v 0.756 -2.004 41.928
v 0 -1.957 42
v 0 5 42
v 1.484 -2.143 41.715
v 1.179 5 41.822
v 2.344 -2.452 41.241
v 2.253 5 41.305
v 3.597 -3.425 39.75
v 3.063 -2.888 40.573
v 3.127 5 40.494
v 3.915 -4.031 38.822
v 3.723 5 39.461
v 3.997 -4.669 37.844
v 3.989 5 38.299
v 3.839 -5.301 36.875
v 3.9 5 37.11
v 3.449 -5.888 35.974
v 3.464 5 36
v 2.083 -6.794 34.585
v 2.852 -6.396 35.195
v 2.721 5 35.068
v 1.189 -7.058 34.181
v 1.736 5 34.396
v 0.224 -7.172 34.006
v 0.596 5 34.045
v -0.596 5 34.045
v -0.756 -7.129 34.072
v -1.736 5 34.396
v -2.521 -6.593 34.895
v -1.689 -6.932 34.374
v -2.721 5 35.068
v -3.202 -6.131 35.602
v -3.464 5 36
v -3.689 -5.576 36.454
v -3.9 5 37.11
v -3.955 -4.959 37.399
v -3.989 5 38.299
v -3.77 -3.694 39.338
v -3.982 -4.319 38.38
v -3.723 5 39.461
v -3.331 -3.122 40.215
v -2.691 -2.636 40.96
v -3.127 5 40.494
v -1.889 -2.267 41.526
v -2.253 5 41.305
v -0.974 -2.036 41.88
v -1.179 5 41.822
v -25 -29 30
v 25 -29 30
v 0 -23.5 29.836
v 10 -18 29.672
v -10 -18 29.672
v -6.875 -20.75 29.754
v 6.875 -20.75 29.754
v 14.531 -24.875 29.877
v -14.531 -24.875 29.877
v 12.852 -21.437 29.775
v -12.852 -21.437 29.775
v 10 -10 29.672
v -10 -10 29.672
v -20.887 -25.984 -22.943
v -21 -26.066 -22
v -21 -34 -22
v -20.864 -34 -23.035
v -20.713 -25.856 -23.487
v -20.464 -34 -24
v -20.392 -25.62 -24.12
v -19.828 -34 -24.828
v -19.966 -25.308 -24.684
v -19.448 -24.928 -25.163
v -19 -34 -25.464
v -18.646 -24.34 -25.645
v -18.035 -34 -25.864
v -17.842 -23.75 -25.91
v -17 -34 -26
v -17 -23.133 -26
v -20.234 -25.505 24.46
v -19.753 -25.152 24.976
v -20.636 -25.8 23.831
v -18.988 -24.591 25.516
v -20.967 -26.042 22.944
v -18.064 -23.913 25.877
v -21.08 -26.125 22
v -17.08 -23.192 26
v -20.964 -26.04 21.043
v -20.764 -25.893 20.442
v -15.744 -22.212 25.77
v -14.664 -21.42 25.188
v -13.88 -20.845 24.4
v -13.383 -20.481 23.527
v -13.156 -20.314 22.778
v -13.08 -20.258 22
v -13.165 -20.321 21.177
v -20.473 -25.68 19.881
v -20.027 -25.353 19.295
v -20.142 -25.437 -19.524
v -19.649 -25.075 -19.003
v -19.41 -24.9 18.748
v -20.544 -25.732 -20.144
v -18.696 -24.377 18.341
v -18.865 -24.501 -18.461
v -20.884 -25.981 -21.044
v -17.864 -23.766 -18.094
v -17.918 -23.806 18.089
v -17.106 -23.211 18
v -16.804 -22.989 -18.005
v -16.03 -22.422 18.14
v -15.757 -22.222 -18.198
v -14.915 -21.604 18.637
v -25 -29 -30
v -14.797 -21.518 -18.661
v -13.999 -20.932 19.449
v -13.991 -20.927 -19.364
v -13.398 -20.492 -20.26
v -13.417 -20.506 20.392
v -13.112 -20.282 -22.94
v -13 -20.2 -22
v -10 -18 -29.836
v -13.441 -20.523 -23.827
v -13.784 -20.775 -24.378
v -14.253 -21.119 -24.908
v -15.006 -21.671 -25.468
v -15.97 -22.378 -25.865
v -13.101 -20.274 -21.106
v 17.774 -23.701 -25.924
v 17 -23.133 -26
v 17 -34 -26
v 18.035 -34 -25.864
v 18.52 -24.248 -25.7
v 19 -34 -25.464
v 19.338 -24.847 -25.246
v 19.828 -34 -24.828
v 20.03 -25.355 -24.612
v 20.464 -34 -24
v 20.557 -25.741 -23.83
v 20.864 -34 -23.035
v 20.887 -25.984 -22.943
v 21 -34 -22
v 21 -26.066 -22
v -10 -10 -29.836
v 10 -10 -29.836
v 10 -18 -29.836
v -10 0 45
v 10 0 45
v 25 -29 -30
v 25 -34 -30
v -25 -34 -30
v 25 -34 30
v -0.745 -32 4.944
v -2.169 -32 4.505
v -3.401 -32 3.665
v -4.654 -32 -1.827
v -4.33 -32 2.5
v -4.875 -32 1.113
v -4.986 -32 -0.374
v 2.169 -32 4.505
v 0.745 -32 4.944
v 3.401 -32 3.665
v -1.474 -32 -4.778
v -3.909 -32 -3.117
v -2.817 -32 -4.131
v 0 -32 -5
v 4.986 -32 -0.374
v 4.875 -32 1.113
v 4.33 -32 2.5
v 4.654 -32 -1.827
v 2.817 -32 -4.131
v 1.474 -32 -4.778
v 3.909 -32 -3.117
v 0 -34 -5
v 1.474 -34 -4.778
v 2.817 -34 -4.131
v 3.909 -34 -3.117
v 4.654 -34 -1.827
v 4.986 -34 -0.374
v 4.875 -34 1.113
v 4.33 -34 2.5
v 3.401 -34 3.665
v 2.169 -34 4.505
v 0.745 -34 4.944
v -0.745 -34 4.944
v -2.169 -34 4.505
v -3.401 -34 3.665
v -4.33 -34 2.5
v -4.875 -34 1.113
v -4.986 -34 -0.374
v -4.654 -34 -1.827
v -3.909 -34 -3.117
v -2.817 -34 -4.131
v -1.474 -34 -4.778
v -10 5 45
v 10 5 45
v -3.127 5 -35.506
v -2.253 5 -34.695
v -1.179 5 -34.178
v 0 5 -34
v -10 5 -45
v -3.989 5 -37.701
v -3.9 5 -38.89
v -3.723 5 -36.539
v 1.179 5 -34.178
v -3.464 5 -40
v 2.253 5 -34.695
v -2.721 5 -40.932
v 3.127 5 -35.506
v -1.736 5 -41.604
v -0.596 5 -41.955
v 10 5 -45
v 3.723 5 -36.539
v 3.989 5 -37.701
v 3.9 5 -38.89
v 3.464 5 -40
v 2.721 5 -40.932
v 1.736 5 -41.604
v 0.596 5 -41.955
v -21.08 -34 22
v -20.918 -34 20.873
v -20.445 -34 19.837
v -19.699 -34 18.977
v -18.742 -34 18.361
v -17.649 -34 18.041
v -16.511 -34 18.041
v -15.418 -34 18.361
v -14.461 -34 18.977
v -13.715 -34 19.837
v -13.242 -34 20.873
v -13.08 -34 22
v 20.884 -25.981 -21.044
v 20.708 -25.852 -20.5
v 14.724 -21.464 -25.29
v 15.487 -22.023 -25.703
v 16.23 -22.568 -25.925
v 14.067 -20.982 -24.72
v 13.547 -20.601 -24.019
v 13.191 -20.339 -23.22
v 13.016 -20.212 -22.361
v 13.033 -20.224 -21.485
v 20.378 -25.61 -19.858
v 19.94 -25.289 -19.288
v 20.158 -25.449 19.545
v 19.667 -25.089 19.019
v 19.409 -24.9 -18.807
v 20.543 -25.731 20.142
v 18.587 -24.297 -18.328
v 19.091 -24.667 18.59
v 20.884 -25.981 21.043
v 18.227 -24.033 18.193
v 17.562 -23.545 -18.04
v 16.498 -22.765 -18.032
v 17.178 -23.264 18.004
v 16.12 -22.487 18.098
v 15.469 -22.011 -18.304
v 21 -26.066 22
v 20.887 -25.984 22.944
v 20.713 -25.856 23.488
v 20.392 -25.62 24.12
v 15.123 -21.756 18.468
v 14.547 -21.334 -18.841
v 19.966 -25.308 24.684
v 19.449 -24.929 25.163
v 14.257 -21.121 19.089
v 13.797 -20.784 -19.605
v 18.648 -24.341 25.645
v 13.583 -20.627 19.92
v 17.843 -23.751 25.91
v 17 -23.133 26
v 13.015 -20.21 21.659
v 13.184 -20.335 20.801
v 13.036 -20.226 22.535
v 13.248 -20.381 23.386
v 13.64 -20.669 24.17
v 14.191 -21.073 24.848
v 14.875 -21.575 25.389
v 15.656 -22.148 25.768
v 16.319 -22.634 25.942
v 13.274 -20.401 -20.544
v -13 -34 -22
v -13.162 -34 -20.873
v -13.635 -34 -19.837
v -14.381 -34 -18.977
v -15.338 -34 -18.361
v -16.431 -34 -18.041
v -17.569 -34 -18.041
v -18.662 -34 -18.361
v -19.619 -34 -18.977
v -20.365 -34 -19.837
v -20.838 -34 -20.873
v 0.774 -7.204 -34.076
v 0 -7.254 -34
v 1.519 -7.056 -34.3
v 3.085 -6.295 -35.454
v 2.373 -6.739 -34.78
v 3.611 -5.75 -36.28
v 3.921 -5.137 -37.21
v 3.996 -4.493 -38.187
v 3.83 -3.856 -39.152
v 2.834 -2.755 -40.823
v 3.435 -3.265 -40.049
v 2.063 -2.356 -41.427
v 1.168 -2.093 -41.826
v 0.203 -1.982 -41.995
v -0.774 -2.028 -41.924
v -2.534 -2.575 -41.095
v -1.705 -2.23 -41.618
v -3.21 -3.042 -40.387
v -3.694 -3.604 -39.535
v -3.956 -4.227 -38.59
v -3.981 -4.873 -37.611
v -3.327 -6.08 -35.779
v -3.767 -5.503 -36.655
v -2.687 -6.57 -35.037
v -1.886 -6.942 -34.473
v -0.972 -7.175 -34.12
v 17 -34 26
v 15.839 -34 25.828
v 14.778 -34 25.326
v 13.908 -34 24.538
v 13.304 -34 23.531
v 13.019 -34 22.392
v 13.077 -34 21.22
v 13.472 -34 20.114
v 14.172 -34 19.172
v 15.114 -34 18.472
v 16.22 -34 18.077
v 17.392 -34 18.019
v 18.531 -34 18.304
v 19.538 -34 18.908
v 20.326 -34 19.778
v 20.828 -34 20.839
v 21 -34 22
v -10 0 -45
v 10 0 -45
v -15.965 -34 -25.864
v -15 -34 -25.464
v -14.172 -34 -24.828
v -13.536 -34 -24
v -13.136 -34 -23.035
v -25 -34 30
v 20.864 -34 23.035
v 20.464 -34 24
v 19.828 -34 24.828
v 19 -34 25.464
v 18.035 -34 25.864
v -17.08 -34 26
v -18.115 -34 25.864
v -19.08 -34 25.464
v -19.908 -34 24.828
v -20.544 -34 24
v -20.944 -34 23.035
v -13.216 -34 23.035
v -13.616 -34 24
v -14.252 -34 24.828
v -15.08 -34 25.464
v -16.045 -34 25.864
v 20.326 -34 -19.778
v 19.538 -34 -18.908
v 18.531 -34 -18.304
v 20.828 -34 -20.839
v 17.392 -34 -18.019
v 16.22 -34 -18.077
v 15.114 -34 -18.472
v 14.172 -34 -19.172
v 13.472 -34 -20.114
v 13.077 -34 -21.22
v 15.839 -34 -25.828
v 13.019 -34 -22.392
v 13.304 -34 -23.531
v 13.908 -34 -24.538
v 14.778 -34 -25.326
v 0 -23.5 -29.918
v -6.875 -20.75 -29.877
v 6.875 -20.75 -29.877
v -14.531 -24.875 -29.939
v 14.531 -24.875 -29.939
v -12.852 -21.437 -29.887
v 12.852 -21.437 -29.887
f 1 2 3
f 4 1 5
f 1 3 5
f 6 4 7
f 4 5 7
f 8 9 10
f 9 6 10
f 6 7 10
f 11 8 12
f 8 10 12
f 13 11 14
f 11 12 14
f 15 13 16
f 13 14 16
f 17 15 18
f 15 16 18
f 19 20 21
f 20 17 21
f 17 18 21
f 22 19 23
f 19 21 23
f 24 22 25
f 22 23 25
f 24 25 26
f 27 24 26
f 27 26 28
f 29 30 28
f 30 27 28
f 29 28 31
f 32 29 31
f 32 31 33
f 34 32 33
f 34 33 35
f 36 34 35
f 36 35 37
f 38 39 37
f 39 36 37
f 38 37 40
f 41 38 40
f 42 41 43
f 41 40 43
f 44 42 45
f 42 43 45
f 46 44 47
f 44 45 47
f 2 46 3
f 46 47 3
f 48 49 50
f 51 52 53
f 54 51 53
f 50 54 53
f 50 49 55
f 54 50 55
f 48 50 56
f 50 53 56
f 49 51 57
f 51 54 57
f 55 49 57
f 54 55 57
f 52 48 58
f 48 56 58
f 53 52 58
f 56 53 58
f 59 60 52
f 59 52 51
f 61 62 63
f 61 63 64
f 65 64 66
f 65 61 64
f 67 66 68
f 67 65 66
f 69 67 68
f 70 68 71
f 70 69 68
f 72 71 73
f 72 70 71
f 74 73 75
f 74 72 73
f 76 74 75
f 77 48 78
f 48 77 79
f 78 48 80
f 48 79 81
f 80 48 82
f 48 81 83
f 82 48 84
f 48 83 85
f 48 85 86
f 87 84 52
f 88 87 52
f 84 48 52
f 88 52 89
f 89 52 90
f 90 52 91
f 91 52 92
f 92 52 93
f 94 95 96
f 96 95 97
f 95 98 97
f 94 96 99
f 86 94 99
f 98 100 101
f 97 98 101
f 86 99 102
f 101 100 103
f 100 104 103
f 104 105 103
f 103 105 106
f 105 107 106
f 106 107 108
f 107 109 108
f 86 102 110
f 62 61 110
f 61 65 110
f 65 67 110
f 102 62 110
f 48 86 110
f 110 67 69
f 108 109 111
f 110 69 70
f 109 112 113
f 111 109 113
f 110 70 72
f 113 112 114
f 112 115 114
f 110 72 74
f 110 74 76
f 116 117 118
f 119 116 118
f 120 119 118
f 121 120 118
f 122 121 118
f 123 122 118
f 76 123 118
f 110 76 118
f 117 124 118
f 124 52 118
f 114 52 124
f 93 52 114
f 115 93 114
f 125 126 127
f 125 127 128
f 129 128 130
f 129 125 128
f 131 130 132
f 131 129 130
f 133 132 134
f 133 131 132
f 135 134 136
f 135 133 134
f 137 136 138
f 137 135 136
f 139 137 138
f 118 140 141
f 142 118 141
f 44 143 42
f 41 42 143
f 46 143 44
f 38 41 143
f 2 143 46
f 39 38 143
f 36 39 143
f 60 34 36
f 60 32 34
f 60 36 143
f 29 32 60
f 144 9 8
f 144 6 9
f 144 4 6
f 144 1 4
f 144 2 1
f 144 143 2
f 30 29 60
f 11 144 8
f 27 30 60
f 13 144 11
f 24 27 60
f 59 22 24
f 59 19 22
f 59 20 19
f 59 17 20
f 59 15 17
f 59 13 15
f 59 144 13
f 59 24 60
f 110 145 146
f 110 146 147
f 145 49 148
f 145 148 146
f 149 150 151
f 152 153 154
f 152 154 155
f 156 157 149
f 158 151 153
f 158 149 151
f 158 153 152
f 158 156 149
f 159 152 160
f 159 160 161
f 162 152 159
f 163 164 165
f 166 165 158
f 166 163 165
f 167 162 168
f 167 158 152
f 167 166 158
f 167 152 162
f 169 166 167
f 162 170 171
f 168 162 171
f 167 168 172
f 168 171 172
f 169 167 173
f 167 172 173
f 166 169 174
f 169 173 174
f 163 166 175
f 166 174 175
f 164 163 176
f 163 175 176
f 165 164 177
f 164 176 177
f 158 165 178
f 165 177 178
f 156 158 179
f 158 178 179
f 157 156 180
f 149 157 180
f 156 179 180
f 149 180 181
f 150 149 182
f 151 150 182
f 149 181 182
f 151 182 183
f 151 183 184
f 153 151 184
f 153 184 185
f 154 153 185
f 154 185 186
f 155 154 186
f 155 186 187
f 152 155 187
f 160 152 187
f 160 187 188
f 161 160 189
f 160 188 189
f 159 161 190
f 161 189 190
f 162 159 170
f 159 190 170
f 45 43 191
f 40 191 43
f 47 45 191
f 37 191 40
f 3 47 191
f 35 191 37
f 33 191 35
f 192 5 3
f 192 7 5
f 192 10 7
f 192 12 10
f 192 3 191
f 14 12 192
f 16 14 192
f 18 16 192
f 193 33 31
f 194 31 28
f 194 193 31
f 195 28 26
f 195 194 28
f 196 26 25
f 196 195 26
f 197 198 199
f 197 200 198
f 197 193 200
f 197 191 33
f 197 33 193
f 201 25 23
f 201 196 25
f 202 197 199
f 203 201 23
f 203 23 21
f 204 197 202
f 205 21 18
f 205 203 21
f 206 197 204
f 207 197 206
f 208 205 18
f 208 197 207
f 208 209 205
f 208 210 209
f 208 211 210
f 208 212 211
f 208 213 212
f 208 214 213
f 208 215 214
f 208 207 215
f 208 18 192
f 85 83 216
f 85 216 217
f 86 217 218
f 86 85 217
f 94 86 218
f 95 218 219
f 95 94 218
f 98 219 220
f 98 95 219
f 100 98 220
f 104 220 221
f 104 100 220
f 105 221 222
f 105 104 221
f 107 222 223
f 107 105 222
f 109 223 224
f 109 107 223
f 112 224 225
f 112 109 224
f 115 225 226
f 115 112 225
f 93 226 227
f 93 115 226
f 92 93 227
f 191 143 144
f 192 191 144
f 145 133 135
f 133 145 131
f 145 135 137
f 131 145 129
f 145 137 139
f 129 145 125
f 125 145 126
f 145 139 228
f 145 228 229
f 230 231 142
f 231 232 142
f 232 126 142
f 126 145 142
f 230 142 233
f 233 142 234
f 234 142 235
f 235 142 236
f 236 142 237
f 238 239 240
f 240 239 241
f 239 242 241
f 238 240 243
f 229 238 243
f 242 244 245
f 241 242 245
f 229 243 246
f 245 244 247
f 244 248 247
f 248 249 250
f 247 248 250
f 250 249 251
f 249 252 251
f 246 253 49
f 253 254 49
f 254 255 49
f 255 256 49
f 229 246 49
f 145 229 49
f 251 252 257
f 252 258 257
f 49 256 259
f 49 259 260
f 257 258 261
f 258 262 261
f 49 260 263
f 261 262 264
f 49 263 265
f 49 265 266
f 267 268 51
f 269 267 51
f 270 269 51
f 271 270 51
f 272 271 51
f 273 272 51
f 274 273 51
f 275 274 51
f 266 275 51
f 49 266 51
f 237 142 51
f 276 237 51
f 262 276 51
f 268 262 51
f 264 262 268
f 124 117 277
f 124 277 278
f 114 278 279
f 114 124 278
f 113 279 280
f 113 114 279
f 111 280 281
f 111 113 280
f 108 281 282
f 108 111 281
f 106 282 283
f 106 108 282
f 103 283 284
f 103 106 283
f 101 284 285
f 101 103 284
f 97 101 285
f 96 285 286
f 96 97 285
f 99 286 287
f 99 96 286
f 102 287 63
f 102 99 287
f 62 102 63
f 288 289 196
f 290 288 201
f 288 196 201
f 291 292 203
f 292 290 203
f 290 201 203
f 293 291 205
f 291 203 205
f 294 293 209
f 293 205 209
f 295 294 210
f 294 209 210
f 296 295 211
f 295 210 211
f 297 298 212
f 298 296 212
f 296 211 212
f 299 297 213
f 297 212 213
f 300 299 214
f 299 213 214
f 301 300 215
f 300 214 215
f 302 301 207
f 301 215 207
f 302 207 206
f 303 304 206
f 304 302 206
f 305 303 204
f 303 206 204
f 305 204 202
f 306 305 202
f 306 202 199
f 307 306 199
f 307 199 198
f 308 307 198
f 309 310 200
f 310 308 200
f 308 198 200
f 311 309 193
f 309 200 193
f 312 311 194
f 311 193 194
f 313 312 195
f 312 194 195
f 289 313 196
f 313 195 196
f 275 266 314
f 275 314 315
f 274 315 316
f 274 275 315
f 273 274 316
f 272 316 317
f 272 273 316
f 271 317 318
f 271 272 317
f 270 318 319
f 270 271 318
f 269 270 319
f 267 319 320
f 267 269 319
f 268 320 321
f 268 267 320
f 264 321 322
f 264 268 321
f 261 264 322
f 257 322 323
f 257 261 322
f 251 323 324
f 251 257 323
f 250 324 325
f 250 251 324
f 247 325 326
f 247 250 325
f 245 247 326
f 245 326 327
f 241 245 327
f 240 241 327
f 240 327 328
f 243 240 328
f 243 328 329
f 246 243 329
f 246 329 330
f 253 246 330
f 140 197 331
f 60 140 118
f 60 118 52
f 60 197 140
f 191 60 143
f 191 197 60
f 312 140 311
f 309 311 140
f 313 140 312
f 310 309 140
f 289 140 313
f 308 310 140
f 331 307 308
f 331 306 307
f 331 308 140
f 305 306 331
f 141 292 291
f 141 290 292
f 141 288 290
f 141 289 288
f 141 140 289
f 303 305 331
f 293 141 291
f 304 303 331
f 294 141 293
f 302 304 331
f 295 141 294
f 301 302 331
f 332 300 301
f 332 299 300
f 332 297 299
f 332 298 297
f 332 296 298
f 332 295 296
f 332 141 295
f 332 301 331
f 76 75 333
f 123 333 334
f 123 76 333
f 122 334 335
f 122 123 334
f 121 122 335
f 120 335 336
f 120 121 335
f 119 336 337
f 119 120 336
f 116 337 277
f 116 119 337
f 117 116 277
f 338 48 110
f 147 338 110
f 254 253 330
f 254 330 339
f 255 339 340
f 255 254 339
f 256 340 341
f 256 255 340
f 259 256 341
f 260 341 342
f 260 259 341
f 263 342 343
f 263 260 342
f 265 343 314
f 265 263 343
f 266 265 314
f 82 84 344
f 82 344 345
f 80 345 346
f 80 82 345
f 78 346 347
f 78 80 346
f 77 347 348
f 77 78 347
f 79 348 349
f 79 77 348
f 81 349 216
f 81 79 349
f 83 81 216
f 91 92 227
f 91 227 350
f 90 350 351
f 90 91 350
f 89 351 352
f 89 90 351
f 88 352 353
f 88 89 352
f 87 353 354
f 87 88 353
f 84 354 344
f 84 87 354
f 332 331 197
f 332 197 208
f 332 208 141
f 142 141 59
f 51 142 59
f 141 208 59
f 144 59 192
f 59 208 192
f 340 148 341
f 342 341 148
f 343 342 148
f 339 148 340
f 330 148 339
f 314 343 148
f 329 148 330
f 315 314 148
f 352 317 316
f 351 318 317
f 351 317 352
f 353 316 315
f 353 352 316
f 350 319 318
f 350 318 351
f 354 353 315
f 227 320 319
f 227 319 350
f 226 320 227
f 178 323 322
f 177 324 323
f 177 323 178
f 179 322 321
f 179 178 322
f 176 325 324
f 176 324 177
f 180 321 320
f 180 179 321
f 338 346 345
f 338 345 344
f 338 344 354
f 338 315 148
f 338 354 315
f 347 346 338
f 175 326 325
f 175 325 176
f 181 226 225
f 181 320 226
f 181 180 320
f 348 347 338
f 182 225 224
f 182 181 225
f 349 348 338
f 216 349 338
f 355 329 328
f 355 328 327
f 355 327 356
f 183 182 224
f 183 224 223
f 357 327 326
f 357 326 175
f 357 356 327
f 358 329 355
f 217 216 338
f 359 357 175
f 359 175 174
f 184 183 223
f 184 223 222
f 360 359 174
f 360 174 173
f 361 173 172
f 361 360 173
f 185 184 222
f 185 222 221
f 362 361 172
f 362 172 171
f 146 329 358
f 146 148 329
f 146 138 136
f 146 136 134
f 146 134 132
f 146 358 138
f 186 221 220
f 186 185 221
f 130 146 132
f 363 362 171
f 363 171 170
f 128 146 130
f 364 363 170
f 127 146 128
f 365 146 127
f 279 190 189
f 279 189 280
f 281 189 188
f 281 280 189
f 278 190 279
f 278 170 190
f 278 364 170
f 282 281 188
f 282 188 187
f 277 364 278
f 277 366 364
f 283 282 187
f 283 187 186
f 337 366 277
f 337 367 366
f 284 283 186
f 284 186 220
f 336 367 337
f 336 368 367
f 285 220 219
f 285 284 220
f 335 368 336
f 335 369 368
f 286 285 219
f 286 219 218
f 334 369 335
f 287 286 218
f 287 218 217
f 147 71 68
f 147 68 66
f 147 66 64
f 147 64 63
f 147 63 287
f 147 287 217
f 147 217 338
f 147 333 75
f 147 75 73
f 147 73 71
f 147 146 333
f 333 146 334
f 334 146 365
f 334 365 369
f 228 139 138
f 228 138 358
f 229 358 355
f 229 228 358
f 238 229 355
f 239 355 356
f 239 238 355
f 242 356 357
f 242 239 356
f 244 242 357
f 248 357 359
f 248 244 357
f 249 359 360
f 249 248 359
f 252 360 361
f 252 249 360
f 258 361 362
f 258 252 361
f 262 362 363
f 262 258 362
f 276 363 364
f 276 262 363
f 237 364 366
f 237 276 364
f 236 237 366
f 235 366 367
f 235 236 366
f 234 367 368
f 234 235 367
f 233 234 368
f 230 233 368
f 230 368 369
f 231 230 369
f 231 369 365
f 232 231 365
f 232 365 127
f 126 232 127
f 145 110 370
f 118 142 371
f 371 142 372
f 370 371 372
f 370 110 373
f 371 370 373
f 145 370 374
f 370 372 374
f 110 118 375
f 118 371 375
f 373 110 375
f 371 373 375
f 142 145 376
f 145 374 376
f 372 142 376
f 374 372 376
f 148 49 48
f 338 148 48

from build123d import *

# Parameters (mm, degrees)
SKETCH1_W               = 20
SKETCH1_H               = 90
BOSS_EXTRUDE1_DEPTH     = 5
BOSS_EXTRUDE2_DEPTH     = 20
SKETCH3_W               = 50
SKETCH3_H               = 60
BOSS_EXTRUDE3_DEPTH     = 5
SKETCH6_W               = 20
SKETCH6_H               = 59.508572424
BOSS_EXTRUDE4_DEPTH     = 8
CUT_EXTRUDE3_DEPTH      = 10
CUT_EXTRUDE3_DEPTH_BACK = 20
SKETCH5_R               = 4
CUT_EXTRUDE4_DEPTH      = 20
SKETCH7_R               = 5
CUT_EXTRUDE5_DEPTH      = 2


with BuildPart() as part:
    # Sketch1 → Boss-Extrude1 (new body)
    with BuildSketch(Plane(origin=(0, 0, 0), x_dir=(1, 0, 0), z_dir=(0, 1, 0))):
        Rectangle(SKETCH1_W, SKETCH1_H)
    extrude(amount=BOSS_EXTRUDE1_DEPTH)

    # Sketch2 → Boss-Extrude2 (add)
    with BuildSketch(Plane(origin=(10, 0, 0), x_dir=(0, 0, -1), z_dir=(1, 0, 0))):
        Polygon((-45, 0), (-29.672384363, -9.999664599), (0.081901849, -9.999664599), (0, 0), align=None)
        Polygon((0, 0), (0.081901849, -9.999664599), (29.836188061, -9.999664599), (45, 0), align=None)
    extrude(amount=-BOSS_EXTRUDE2_DEPTH)

    # Sketch6 → Boss-Extrude4 (add)
    with BuildSketch(Plane.XZ.offset(9.999664599)):
        with Locations((0, -0.081901849)):
            Rectangle(SKETCH6_W, SKETCH6_H)
    extrude(amount=BOSS_EXTRUDE4_DEPTH)


with BuildPart() as body_2:
    # Sketch3 → Boss-Extrude3 (new body)
    with BuildSketch(Plane(origin=(0, -28.999664599, 0), x_dir=(-1, 0, 0), z_dir=(0, -1, 0))):
        Rectangle(SKETCH3_W, SKETCH3_H)
    extrude(amount=BOSS_EXTRUDE3_DEPTH)


    add(part.part)  # loft3 joins it to this body
    # loft from a face of the part (loft3)
    loft([body_2.faces().sort_by_distance((0, -28.999664599, 0))[0], body_2.faces().sort_by_distance((0, -17.999664599, -0.081901849))[0]])

    # Sketch4 → Cut-Extrude3 (cut, two sides: drawn at the far end of the back side and taken through both)
    with BuildSketch(Plane.XZ.offset(33.999664599).offset(-CUT_EXTRUDE3_DEPTH_BACK)):
        with BuildLine():
            ThreePointArc((-13.080007345, 22), (-14.251580221, 24.828427125), (-17.080007345, 26))
            Line((-17.080007345, 26), (-17.080007345, 22))
            Line((-17.080007345, 22), (-21.080007345, 22))
            ThreePointArc((-21.080007345, 22), (-17.080007345, 18), (-13.080007345, 22))
        make_face()
        with BuildLine():
            Line((-17.080007345, 22), (-17.080007345, 26))
            ThreePointArc((-17.080007345, 26), (-19.90843447, 24.828427125), (-21.080007345, 22))
            Line((-21.080007345, 22), (-17.080007345, 22))
        make_face()
        with BuildLine():
            ThreePointArc((21, 22), (19.828427125, 24.828427125), (17, 26))
            Line((17, 26), (17, 22))
            Line((17, 22), (21, 22))
        make_face()
        with BuildLine():
            Line((17, 22), (17, 26))
            ThreePointArc((17, 26), (14.171572875, 19.171572875), (21, 22))
            Line((21, 22), (17, 22))
        make_face()
        with BuildLine():
            ThreePointArc((-21, -22), (-19.828427125, -24.828427125), (-17, -26))
            Line((-17, -26), (-17, -22))
            Line((-17, -22), (-21, -22))
        make_face()
        with BuildLine():
            Line((-17, -22), (-17, -26))
            ThreePointArc((-17, -26), (-14.171572875, -24.828427125), (-13, -22))
            ThreePointArc((-13, -22), (-17, -18), (-21, -22))
            Line((-21, -22), (-17, -22))
        make_face()
        with BuildLine():
            ThreePointArc((21, -22), (14.171572875, -19.171572875), (17, -26))
            Line((17, -26), (17, -22))
            Line((17, -22), (21, -22))
        make_face()
        with BuildLine():
            Line((17, -22), (17, -26))
            ThreePointArc((17, -26), (19.828427125, -24.828427125), (21, -22))
            Line((21, -22), (17, -22))
        make_face()
    extrude(amount=CUT_EXTRUDE3_DEPTH + CUT_EXTRUDE3_DEPTH_BACK, mode=Mode.SUBTRACT)

    # Sketch5 → Cut-Extrude4 (cut)
    with BuildSketch(Plane(origin=(0, 5, 0), x_dir=(1, 0, 0), z_dir=(0, 1, 0))):
        with Locations(Location((0, 38, 0), (0, 0, 270))):
            Circle(SKETCH5_R)
        with Locations(Location((0, -38, 0), (0, 0, 270))):
            Circle(SKETCH5_R)
    extrude(amount=-CUT_EXTRUDE4_DEPTH, mode=Mode.SUBTRACT)

    # Sketch7 → Cut-Extrude5 (cut)
    with BuildSketch(Plane.XZ.offset(33.999664599)):
        with Locations(Location((0, 0, 0), (0, 0, 270))):
            Circle(SKETCH7_R)
    extrude(amount=-CUT_EXTRUDE5_DEPTH, mode=Mode.SUBTRACT)


solid = body_2.part
